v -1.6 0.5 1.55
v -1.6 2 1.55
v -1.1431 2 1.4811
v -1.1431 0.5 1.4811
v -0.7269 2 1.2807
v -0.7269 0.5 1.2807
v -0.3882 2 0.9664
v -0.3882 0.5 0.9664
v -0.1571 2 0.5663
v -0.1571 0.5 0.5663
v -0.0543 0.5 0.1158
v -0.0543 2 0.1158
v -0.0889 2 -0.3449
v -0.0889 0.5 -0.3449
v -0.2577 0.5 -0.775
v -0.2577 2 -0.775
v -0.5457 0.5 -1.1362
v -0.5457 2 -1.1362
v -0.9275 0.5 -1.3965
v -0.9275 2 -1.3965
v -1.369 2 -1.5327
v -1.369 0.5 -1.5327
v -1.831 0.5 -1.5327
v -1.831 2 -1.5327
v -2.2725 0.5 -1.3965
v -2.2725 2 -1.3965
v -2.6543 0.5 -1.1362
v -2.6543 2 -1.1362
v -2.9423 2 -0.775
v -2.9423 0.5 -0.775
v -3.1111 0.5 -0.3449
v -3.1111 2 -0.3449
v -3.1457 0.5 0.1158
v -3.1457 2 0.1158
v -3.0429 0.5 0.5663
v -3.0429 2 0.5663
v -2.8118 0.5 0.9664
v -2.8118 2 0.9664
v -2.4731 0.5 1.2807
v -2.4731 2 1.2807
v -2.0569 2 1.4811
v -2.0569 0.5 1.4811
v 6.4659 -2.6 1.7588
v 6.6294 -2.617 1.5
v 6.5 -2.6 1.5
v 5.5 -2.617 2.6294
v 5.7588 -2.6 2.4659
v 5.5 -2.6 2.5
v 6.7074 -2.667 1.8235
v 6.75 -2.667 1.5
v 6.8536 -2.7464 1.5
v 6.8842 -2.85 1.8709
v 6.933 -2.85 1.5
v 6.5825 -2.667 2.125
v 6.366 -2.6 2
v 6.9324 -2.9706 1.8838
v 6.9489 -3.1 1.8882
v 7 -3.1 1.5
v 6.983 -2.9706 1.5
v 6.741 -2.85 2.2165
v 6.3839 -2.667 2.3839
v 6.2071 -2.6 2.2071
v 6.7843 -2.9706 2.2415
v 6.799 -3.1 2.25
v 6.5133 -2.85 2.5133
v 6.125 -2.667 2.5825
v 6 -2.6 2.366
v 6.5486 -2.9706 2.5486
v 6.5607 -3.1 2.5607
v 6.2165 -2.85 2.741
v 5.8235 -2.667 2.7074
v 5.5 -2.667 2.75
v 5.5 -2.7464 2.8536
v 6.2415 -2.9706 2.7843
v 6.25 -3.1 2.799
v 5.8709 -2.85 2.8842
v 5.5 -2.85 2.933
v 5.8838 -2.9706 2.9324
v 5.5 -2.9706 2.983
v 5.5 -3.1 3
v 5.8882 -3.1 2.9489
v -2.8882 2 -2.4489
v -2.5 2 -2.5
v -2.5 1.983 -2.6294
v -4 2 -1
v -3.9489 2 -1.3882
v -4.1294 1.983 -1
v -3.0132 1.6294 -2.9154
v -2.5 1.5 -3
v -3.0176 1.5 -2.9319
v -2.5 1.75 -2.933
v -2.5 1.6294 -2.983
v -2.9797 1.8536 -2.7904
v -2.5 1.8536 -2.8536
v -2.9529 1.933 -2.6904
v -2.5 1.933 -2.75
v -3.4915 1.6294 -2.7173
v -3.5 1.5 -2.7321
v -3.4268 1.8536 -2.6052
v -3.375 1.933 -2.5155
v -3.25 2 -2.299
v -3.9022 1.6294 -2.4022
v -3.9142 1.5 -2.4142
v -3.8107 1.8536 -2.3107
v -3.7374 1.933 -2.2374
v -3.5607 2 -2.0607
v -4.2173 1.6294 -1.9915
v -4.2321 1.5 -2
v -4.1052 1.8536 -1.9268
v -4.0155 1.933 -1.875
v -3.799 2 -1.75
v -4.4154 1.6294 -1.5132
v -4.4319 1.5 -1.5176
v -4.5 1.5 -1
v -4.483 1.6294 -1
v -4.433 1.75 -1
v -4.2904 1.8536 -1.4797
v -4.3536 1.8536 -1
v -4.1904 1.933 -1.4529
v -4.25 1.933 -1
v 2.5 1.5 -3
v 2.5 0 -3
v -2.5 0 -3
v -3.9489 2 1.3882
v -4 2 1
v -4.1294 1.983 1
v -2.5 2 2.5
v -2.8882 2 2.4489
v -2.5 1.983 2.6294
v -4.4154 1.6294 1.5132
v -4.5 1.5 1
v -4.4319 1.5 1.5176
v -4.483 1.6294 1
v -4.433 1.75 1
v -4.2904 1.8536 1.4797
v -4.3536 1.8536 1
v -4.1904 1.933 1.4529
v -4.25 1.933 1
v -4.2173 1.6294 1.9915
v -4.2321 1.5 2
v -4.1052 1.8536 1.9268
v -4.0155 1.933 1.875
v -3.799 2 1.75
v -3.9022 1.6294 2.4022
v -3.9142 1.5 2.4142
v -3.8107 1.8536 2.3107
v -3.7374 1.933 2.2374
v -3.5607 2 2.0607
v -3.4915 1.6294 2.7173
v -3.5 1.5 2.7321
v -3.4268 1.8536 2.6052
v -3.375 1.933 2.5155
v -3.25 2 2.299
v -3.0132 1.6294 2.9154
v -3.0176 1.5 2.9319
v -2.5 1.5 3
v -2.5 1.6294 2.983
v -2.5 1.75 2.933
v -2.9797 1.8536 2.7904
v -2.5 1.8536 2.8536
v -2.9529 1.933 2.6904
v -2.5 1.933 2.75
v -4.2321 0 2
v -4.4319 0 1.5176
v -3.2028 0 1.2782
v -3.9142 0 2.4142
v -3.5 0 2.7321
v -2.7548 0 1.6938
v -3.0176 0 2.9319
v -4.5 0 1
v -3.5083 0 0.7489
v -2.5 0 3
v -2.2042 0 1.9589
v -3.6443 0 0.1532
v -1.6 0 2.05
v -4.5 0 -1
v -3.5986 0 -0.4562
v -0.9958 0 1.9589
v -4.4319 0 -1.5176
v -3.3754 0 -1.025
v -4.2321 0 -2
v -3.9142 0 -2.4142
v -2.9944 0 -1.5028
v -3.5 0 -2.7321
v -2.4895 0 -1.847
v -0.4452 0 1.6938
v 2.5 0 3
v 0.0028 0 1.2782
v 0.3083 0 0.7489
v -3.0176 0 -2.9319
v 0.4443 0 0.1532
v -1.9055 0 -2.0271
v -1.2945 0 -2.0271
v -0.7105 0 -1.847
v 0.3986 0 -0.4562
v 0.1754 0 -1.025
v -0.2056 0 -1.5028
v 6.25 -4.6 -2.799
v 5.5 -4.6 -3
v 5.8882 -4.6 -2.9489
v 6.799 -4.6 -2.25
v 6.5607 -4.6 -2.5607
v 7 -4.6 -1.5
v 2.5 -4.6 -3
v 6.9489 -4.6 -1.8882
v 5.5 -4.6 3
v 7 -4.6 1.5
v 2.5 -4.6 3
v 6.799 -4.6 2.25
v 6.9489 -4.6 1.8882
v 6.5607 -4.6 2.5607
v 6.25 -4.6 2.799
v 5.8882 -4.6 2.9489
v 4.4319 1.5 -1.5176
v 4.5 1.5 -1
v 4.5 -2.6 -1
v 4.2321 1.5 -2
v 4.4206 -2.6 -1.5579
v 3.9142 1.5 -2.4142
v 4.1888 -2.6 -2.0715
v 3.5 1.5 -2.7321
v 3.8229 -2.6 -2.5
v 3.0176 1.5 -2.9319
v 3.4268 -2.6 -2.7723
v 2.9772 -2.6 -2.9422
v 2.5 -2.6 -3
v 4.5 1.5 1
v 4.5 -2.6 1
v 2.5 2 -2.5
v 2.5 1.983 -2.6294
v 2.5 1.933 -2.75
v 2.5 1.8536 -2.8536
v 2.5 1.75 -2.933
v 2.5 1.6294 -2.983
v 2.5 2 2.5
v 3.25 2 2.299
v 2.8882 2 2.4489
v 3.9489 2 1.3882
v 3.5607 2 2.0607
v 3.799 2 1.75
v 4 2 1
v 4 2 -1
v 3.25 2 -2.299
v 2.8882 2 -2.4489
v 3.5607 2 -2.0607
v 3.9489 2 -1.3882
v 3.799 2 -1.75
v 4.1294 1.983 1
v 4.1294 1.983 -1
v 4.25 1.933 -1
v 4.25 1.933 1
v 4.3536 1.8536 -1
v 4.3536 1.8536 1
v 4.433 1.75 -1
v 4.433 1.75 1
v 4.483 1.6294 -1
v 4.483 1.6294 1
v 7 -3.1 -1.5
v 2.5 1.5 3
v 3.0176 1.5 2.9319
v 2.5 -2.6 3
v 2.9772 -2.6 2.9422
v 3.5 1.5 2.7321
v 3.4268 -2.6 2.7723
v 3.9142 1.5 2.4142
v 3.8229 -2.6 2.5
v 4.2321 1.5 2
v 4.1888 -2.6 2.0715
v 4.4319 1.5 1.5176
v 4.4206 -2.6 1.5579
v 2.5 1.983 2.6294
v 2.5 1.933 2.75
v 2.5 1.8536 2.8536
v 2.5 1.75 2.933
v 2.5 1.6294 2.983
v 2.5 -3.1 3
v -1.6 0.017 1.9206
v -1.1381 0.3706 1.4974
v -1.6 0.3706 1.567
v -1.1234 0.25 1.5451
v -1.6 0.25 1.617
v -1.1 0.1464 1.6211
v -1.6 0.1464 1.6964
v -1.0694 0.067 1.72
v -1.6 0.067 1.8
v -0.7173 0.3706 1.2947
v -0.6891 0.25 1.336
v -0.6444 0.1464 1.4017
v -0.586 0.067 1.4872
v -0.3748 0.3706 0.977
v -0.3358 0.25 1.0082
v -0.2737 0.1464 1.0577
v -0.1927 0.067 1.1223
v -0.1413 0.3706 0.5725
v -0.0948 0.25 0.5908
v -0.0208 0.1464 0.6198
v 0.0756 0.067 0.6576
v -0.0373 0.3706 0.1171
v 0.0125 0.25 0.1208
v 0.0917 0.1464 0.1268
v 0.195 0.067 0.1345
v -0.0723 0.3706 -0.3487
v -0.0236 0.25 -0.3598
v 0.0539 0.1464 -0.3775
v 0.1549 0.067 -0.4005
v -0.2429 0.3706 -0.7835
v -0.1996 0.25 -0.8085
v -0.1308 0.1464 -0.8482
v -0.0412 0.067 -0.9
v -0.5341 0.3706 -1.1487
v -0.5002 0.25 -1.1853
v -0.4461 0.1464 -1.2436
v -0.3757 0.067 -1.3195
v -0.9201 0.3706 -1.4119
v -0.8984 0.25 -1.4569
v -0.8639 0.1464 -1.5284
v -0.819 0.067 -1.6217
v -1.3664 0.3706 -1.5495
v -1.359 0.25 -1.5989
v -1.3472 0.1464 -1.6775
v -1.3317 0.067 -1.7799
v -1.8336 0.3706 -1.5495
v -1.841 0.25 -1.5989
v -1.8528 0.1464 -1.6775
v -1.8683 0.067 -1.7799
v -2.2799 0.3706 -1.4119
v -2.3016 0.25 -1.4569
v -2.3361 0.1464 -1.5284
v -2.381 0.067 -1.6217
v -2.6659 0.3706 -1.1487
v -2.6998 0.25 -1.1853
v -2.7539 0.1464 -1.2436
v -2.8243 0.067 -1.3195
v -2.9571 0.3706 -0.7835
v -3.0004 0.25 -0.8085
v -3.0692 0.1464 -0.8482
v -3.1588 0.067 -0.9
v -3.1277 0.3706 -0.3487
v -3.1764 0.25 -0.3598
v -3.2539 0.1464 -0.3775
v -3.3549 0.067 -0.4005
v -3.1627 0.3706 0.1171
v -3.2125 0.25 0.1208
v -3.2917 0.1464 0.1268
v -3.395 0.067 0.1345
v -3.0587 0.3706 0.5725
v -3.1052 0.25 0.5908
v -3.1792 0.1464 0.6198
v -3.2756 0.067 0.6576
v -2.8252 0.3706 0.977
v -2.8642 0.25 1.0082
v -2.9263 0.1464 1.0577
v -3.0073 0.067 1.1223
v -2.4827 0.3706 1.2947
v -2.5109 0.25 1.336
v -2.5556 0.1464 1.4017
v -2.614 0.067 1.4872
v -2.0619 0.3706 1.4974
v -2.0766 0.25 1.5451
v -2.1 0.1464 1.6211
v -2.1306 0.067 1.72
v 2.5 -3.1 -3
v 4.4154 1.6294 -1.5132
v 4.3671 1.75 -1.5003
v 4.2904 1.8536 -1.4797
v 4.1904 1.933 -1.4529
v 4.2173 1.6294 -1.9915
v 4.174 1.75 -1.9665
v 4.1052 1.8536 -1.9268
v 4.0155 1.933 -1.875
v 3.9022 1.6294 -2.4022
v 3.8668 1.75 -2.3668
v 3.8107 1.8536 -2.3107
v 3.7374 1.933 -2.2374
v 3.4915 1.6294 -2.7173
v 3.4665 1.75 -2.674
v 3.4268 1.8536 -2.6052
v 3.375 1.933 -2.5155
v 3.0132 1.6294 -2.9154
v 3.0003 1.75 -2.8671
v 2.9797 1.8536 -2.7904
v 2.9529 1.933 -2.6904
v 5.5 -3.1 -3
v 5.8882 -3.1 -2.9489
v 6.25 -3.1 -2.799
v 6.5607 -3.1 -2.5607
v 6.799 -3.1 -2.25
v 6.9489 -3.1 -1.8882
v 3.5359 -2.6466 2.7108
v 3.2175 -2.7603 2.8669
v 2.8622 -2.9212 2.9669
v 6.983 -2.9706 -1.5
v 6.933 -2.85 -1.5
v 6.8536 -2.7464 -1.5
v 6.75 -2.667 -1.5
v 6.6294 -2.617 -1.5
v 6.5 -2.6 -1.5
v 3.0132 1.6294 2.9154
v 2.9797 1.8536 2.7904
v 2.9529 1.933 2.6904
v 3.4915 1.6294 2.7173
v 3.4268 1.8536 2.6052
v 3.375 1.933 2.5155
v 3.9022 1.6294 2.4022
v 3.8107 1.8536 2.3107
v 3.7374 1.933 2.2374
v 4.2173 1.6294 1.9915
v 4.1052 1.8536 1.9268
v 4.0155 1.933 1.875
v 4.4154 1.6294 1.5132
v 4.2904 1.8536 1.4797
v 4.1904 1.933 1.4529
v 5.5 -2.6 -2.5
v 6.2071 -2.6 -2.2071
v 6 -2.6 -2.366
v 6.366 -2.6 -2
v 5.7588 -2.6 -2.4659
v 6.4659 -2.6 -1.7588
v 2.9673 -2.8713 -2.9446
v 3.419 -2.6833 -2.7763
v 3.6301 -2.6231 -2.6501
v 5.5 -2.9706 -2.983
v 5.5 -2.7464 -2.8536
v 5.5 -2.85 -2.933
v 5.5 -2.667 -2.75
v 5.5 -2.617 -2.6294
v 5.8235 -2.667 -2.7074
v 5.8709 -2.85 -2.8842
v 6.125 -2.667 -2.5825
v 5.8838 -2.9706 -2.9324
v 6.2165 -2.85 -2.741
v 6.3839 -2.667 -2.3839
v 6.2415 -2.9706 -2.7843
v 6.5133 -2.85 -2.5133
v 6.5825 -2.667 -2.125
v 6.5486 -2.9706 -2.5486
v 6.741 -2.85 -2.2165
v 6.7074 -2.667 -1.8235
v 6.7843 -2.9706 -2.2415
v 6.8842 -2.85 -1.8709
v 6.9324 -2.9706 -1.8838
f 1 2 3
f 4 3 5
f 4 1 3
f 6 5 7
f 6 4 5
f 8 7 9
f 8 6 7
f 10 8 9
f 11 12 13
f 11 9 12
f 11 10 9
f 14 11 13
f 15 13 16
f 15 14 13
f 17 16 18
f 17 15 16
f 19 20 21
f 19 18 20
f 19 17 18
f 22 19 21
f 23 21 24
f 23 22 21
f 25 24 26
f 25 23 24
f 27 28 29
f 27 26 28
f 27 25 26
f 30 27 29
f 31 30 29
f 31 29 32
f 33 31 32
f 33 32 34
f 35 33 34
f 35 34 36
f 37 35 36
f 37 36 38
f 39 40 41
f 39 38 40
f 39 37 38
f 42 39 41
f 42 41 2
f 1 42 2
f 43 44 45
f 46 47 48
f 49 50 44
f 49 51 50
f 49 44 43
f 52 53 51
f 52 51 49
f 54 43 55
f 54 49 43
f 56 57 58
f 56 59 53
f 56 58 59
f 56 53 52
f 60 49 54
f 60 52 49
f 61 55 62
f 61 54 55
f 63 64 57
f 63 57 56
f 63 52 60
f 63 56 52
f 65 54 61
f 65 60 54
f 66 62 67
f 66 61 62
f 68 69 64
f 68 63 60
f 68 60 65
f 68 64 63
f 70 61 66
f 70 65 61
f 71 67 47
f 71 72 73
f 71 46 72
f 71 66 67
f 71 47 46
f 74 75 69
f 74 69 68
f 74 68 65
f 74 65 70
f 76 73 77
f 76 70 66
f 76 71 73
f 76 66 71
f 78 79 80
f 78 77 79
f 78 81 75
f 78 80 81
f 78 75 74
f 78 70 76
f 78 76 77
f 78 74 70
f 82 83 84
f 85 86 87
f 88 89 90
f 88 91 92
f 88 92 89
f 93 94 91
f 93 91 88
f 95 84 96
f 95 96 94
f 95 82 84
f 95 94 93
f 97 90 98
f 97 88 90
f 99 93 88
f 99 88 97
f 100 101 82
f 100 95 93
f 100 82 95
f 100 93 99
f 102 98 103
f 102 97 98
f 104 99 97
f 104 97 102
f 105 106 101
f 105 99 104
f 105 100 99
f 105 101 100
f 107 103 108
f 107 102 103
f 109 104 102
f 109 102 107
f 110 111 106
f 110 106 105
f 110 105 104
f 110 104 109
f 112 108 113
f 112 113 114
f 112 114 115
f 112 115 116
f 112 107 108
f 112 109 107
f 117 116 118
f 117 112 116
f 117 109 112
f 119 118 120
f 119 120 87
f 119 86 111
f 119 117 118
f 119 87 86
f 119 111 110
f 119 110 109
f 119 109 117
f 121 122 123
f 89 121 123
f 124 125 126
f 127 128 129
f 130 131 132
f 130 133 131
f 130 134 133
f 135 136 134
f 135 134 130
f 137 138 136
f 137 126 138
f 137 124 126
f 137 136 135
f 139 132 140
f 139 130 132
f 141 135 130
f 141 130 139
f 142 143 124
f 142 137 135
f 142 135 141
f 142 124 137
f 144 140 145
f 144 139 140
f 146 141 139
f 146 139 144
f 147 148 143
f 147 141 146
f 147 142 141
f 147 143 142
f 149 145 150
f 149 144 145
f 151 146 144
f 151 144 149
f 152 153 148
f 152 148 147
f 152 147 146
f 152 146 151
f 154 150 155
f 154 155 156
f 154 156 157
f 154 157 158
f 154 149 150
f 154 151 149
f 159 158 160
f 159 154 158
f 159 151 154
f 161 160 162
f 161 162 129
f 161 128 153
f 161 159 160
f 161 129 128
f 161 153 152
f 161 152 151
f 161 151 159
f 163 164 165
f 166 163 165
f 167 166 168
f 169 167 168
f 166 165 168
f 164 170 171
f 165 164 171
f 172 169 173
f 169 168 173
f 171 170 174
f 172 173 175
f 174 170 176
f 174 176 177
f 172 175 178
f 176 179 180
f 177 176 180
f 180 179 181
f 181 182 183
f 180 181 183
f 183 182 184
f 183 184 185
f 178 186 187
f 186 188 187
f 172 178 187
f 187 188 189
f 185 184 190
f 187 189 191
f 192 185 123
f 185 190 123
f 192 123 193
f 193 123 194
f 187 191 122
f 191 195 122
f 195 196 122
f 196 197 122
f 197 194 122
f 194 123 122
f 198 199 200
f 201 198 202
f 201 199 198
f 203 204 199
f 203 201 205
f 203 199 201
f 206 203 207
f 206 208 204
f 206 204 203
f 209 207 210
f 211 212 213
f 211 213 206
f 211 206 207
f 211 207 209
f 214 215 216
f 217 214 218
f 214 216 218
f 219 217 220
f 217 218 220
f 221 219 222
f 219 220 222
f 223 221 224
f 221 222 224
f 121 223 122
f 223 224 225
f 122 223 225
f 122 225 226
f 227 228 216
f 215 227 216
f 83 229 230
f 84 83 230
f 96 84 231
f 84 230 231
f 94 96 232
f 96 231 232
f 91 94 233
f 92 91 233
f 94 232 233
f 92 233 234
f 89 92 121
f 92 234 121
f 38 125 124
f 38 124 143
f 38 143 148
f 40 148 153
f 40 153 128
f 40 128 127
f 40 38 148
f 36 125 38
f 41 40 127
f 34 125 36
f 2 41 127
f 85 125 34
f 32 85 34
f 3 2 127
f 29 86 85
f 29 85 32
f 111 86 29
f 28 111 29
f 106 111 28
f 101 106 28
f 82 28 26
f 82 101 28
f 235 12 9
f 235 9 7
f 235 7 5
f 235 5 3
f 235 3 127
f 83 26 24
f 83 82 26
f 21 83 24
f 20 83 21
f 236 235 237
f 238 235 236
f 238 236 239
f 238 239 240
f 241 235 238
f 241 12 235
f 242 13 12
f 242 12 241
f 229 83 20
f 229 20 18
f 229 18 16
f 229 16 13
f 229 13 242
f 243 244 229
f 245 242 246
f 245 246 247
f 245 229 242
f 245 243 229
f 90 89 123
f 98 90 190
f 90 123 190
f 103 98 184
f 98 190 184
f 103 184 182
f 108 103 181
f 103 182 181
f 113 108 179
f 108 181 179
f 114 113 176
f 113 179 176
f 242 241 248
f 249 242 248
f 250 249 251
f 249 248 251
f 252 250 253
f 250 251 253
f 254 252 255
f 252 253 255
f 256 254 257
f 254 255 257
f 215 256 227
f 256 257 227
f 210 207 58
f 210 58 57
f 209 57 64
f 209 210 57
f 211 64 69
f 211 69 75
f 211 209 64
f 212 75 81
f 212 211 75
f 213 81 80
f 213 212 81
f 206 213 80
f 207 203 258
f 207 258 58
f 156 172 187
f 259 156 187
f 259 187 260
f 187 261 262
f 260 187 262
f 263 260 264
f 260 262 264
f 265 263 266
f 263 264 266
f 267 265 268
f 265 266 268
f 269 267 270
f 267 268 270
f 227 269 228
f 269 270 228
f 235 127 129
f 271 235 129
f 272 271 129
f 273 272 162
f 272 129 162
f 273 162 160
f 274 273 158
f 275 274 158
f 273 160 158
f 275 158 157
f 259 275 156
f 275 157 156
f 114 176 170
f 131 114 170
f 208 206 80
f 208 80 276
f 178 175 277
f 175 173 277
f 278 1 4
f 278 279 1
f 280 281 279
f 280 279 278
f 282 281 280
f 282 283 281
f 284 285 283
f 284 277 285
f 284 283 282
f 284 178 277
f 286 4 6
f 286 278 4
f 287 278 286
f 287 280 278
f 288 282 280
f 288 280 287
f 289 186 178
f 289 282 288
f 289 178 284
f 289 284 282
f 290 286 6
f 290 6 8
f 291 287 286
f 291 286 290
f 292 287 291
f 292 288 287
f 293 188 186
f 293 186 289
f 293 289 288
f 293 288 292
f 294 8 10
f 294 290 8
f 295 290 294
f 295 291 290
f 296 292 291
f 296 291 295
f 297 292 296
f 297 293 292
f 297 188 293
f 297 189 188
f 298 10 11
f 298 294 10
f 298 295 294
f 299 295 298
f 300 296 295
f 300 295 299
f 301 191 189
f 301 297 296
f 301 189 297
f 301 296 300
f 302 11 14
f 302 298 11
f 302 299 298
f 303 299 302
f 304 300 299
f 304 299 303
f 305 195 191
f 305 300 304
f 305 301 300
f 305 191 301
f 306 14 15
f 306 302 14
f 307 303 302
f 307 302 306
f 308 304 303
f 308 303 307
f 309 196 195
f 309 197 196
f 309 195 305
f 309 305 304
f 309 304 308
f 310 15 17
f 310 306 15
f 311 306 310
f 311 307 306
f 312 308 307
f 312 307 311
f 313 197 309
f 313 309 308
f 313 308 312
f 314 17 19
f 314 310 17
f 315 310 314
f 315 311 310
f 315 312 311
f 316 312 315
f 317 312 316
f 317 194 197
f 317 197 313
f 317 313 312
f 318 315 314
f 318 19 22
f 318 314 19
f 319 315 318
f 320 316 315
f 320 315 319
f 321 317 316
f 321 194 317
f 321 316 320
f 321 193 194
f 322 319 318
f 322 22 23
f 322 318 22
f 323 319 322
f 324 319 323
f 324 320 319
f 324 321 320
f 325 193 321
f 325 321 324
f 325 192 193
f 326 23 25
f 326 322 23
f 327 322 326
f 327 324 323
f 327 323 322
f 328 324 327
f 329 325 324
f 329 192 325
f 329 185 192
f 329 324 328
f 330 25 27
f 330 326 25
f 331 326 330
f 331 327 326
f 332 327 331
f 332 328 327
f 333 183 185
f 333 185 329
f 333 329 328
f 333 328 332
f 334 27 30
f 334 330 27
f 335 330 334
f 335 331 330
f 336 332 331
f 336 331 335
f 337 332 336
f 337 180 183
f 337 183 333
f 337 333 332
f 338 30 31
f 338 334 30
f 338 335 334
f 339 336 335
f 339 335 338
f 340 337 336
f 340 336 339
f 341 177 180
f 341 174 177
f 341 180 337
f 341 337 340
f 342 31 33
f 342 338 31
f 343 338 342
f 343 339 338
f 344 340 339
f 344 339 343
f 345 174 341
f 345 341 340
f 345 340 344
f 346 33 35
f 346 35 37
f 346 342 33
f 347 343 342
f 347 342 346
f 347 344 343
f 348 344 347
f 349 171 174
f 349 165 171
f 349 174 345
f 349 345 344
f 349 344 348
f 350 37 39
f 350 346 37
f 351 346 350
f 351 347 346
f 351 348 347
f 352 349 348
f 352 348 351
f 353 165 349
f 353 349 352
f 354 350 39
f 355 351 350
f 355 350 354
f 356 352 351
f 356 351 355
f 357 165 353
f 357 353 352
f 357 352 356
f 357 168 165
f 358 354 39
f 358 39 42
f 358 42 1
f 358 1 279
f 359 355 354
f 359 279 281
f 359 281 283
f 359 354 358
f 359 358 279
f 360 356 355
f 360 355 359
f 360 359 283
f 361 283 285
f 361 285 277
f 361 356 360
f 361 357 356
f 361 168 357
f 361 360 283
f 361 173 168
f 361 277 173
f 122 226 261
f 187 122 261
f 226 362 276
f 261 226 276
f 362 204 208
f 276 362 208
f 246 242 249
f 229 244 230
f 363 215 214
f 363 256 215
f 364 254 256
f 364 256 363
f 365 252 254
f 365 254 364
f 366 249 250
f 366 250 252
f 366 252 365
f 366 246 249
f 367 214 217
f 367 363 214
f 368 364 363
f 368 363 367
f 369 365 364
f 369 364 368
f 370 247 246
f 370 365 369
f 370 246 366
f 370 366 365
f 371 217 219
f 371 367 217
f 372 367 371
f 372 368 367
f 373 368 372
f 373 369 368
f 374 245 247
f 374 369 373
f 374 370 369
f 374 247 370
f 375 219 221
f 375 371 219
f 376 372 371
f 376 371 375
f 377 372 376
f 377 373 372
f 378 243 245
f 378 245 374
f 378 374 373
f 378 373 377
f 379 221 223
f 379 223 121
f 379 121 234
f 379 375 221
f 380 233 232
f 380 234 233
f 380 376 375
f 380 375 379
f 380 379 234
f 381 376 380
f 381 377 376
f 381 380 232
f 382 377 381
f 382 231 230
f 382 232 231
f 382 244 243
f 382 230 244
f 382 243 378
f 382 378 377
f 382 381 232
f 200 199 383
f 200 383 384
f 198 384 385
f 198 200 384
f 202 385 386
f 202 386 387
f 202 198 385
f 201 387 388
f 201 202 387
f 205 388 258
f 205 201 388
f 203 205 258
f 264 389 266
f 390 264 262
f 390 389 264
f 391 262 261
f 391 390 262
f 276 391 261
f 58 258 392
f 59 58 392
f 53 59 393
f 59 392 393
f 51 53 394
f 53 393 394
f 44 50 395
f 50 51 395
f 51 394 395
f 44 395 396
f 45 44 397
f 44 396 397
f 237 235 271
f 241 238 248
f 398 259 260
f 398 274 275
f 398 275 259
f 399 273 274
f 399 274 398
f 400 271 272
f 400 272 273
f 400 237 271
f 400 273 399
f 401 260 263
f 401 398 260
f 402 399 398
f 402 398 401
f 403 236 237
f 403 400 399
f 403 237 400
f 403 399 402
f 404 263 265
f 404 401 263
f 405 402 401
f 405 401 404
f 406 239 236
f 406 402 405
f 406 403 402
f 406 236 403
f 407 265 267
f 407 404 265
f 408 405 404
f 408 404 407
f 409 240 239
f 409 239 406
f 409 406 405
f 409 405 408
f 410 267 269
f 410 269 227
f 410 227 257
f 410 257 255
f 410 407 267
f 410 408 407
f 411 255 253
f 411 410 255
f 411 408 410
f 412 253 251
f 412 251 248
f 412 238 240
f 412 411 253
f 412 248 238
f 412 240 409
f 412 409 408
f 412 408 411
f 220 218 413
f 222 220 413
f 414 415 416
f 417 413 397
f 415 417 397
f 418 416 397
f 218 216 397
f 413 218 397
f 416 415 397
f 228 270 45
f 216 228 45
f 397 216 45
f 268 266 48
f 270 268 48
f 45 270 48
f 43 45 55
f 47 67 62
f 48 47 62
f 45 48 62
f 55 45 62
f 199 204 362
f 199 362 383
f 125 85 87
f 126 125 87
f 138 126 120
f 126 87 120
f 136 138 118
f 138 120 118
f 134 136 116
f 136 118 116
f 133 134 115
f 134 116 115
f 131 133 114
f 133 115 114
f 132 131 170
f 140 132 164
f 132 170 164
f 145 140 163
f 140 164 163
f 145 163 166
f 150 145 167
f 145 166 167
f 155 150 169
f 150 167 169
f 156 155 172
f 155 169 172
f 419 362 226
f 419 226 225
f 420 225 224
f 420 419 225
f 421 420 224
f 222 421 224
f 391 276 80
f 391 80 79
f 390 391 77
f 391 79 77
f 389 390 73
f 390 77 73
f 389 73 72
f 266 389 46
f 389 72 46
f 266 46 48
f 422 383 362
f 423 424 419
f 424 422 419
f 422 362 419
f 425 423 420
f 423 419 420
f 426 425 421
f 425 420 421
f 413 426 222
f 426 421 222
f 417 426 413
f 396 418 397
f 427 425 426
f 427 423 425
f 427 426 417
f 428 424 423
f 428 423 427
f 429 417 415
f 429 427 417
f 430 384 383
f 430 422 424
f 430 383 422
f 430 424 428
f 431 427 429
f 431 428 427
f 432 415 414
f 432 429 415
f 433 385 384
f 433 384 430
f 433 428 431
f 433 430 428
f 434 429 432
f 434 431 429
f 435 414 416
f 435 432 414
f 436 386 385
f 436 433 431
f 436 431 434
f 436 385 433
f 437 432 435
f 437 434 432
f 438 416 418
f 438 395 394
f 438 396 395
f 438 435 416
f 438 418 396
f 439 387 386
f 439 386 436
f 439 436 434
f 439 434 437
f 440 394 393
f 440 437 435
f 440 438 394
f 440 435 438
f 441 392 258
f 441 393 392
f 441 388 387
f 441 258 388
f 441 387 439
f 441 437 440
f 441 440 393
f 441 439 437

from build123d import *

# Parameters (mm, degrees)
BOSS_EXTRUDE1_DEPTH     = 2
CUT_EXTRUDE1_DEPTH      = 6.766281297
CUT_EXTRUDE1_DEPTH_BACK = 6.766281297
SKETCH2_R               = 1.55
BOSS_EXTRUDE2_START     = 4.6
BOSS_EXTRUDE2_DEPTH     = 4.6
BOSS_EXTRUDE3_DEPTH     = 2
FILLET1_R               = 0.5


with BuildPart() as part:
    # Sketch1 → Boss-Extrude1 (new body)
    with BuildSketch(Plane(origin=(0, 0, 0), x_dir=(1, 0, 0), z_dir=(0, 1, 0))):
        with BuildLine():
            Line((2.5, 3), (-2.5, 3))
            ThreePointArc((-2.5, 3), (-3.914213562, 2.414213562), (-4.5, 1))
            Line((-4.5, 1), (-4.5, -1))
            ThreePointArc((-4.5, -1), (-3.914213562, -2.414213562), (-2.5, -3))
            Line((-2.5, -3), (2.5, -3))
            ThreePointArc((2.5, -3), (3.914213562, -2.414213562), (4.5, -1))
            Line((4.5, -1), (4.5, 1))
            ThreePointArc((4.5, 1), (3.914213562, 2.414213562), (2.5, 3))
        make_face()
    extrude(amount=BOSS_EXTRUDE1_DEPTH)

    # Sketch2 → Cut-Extrude1 (cut, two sides: drawn at the far end of the back side and taken through both)
    with BuildSketch(Plane(origin=(0, 2, 0), x_dir=(1, 0, 0), z_dir=(0, 1, 0)).offset(-CUT_EXTRUDE1_DEPTH_BACK)):
        with Locations(Location((-1.6, 0, 0), (0, 0, 270))):
            Circle(SKETCH2_R)
    extrude(amount=CUT_EXTRUDE1_DEPTH + CUT_EXTRUDE1_DEPTH_BACK, mode=Mode.SUBTRACT)

    # Sketch3 → Boss-Extrude2 (add)
    with BuildSketch(Plane.XZ.offset(BOSS_EXTRUDE2_START)):
        with BuildLine():
            Line((4.5, 1), (4.5, -1))
            ThreePointArc((4.5, -1), (3.914213562, -2.414213562), (2.5, -3))
            Line((2.5, -3), (2.5, 3))
            ThreePointArc((2.5, 3), (3.914213562, 2.414213562), (4.5, 1))
        make_face()
    extrude(amount=-BOSS_EXTRUDE2_DEPTH)

    # Sketch4 → Boss-Extrude3 (add)
    with BuildSketch(Plane.XZ.offset(4.6)):
        with BuildLine():
            Line((4.5, 1), (4.5, -1))
            ThreePointArc((4.5, -1), (3.914213562, -2.414213562), (2.5, -3))
            Line((2.5, -3), (5.5, -3))
            ThreePointArc((5.5, -3), (6.560660172, -2.560660172), (7, -1.5))
            Line((7, -1.5), (7, 1.5))
            ThreePointArc((7, 1.5), (6.560660172, 2.560660172), (5.5, 3))
            Line((5.5, 3), (2.5, 3))
            ThreePointArc((2.5, 3), (3.914213562, 2.414213562), (4.5, 1))
        make_face()
    extrude(amount=-BOSS_EXTRUDE3_DEPTH)

    # Fillet1
    # the kernel refuses this fillet: 0.5 mm, written as the material it takes off along each edge
    with BuildSketch(Plane(origin=(-2.5, 2, 1), x_dir=(-1, 0, 0), z_dir=(0, 0, -1))) as fillet1_piece_1:
        with BuildLine():
            CenterArc((2 - FILLET1_R, -FILLET1_R), FILLET1_R, 0, 90)
            Line((2, -FILLET1_R), (2, 0))
            Line((2, 0), (2 - FILLET1_R, 0))
        make_face()
    revolve(axis=Axis((-2.5, 2, 1), (0, 1, 0)), revolution_arc=90, mode=Mode.SUBTRACT)
    with BuildSketch(Plane(origin=(-2.5, 2, 3), x_dir=(0, 0, -1), z_dir=(1, 0, 0)), Plane(origin=(2.5, 2, -3), x_dir=(0, 0, 1), z_dir=(-1, 0, 0))) as fillet1_piece_2:
        with BuildLine():
            CenterArc((FILLET1_R, -FILLET1_R), FILLET1_R, 90, 90)
            Line((0, -FILLET1_R), (0, 0))
            Line((0, 0), (FILLET1_R, 0))
        make_face()
    extrude(amount=5, mode=Mode.SUBTRACT)
    with BuildSketch(Plane(origin=(2.5, 2, 1), x_dir=(0, 0, 1), z_dir=(-1, 0, 0))) as fillet1_piece_3:
        with BuildLine():
            CenterArc((2 - FILLET1_R, -FILLET1_R), FILLET1_R, 0, 90)
            Line((2 - FILLET1_R, 0), (2, 0))
            Line((2, 0), (2, -FILLET1_R))
        make_face()
    revolve(axis=Axis((2.5, 2, 1), (0, 1, 0)), revolution_arc=90, mode=Mode.SUBTRACT)
    with BuildSketch(Plane(origin=(4.5, 2, 1), x_dir=(0, -1, 0), z_dir=(0, 0, -1))) as fillet1_piece_4:
        with BuildLine():
            CenterArc((FILLET1_R, FILLET1_R), FILLET1_R, 180, 90)
            Line((0, FILLET1_R), (0, 0))
            Line((0, 0), (FILLET1_R, 0))
        make_face()
    extrude(amount=2, mode=Mode.SUBTRACT)
    with BuildSketch(Plane(origin=(-1.6, 0, 0), x_dir=(0, 0, 1), z_dir=(-1, 0, 0))) as fillet1_piece_5:
        with BuildLine():
            CenterArc((1.55 + FILLET1_R, FILLET1_R), FILLET1_R, 180, 90)
            Line((1.55 + FILLET1_R, 0), (1.55, 0))
            Line((1.55, 0), (1.55, FILLET1_R))
        make_face()
    revolve(axis=Axis((-1.6, 0, 0), (0, 1, 0)), mode=Mode.SUBTRACT)
    with BuildSketch(Plane(origin=(2.5, 2, -1), x_dir=(1, 0, 0), z_dir=(0, 0, 1))) as fillet1_piece_6:
        with BuildLine():
            CenterArc((2 - FILLET1_R, -FILLET1_R), FILLET1_R, 0, 90)
            Line((2 - FILLET1_R, 0), (2, 0))
            Line((2, 0), (2, -FILLET1_R))
        make_face()
    revolve(axis=Axis((2.5, 2, -1), (0, 1, 0)), revolution_arc=90, mode=Mode.SUBTRACT)
    with BuildSketch(Plane(origin=(5.5, -2.6, 3), x_dir=(0, 0, -1), z_dir=(-1, 0, 0))) as fillet1_piece_7_section:
        with BuildLine():
            CenterArc((FILLET1_R, FILLET1_R), FILLET1_R, 180, 90)
            Line((0, FILLET1_R), (0, 0))
            Line((0, 0), (FILLET1_R, 0))
        make_face()
    fillet1_piece_7 = extrude(amount=4.25, mode=Mode.PRIVATE)
    fillet1_piece_7 = fillet1_piece_7 - Plane(origin=(2.5, -2.684531393, 1), x_dir=(0, 0, 1), z_dir=(0, -1, 0)) * Cylinder(2, 11, mode=Mode.PRIVATE)
    add(fillet1_piece_7, mode=Mode.SUBTRACT)
    with BuildSketch(Plane(origin=(5.5, -2.6, 1.5), x_dir=(1, 0, 0), z_dir=(0, 0, -1))) as fillet1_piece_8:
        with BuildLine():
            CenterArc((1.5 - FILLET1_R, FILLET1_R), FILLET1_R, 270, 90)
            Line((1.5, FILLET1_R), (1.5, 0))
            Line((1.5, 0), (1.5 - FILLET1_R, 0))
        make_face()
    revolve(axis=Axis((5.5, -2.6, 1.5), (0, -1, 0)), revolution_arc=90, mode=Mode.SUBTRACT)
    with BuildSketch(Plane(origin=(7, -2.6, -1.5), x_dir=(-1, 0, 0), z_dir=(0, 0, 1))) as fillet1_piece_9:
        with BuildLine():
            CenterArc((FILLET1_R, FILLET1_R), FILLET1_R, 180, 90)
            Line((0, FILLET1_R), (0, 0))
            Line((0, 0), (FILLET1_R, 0))
        make_face()
    extrude(amount=3, mode=Mode.SUBTRACT)
    with BuildSketch(Plane(origin=(5.5, -2.6, -1.5), x_dir=(0, 0, -1), z_dir=(-1, 0, 0))) as fillet1_piece_10:
        with BuildLine():
            CenterArc((1.5 - FILLET1_R, FILLET1_R), FILLET1_R, 270, 90)
            Line((1.5, FILLET1_R), (1.5, 0))
            Line((1.5, 0), (1.5 - FILLET1_R, 0))
        make_face()
    revolve(axis=Axis((5.5, -2.6, -1.5), (0, -1, 0)), revolution_arc=90, mode=Mode.SUBTRACT)
    with BuildSketch(Plane(origin=(1.25, -2.6, -3), x_dir=(0, 0, 1), z_dir=(1, 0, 0))) as fillet1_piece_11_section:
        with BuildLine():
            CenterArc((FILLET1_R, FILLET1_R), FILLET1_R, 180, 90)
            Line((0, FILLET1_R), (0, 0))
            Line((0, 0), (FILLET1_R, 0))
        make_face()
    fillet1_piece_11 = extrude(amount=4.25, mode=Mode.PRIVATE)
    fillet1_piece_11 = fillet1_piece_11 - Plane(origin=(2.5, -2.72746411, -1), x_dir=(1, 0, 0), z_dir=(0, -1, 0)) * Cylinder(2, 11, mode=Mode.PRIVATE)
    add(fillet1_piece_11, mode=Mode.SUBTRACT)
    with BuildSketch(Plane(origin=(-2.5, 2, -1), x_dir=(0, 0, -1), z_dir=(1, 0, 0))) as fillet1_piece_12:
        with BuildLine():
            CenterArc((2 - FILLET1_R, -FILLET1_R), FILLET1_R, 0, 90)
            Line((2, -FILLET1_R), (2, 0))
            Line((2, 0), (2 - FILLET1_R, 0))
        make_face()
    revolve(axis=Axis((-2.5, 2, -1), (0, 1, 0)), revolution_arc=90, mode=Mode.SUBTRACT)
    with BuildSketch(Plane(origin=(-4.5, 2, -1), x_dir=(1, 0, 0), z_dir=(0, 0, 1))) as fillet1_piece_13:
        with BuildLine():
            CenterArc((FILLET1_R, -FILLET1_R), FILLET1_R, 90, 90)
            Line((0, -FILLET1_R), (0, 0))
            Line((0, 0), (FILLET1_R, 0))
        make_face()
    extrude(amount=2, mode=Mode.SUBTRACT)


solid = part.part
